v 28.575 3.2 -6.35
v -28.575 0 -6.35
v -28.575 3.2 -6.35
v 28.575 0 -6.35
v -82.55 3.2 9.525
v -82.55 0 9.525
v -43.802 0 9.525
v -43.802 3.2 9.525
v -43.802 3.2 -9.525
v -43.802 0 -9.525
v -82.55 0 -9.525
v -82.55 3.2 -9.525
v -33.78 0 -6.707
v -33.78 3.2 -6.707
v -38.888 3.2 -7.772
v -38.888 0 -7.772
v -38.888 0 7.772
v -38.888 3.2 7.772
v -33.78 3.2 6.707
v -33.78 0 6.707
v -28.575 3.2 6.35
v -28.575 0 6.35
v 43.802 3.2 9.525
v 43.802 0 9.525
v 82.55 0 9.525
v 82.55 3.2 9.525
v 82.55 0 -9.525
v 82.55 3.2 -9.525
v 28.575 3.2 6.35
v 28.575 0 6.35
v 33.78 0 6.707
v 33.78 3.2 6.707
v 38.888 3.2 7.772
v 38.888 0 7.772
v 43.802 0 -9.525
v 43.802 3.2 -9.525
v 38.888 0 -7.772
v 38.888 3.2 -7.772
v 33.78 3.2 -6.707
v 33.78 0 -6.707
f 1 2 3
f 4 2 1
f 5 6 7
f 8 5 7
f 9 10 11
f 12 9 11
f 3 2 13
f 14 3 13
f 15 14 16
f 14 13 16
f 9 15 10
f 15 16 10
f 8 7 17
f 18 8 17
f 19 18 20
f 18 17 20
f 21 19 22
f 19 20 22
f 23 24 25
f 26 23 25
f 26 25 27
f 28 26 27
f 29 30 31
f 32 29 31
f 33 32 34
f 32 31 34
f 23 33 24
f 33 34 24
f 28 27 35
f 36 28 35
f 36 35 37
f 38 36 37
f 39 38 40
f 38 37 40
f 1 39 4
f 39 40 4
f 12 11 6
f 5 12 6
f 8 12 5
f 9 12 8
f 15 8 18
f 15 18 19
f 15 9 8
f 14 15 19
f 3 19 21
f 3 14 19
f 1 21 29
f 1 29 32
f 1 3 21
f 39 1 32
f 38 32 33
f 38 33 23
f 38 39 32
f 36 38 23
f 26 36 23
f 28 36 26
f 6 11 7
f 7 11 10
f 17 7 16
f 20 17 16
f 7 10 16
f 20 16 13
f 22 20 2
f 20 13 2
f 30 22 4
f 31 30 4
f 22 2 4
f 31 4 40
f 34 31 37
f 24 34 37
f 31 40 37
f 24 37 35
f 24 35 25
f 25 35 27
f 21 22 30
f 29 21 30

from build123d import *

# Parameters (mm, degrees)
SKETCH1_W           = 57.15
SKETCH1_H           = 12.7
BOSS_EXTRUDE1_DEPTH = 3.2


with BuildPart() as part:
    # Sketch1 → Boss-Extrude1 (new body)
    with BuildSketch(Plane(origin=(0, 0, 0), x_dir=(1, 0, 0), z_dir=(0, 1, 0))):
        with BuildLine():
            Line((-28.575, -6.35), (-28.575, 6.35))
            ThreePointArc((-28.575, 6.35), (-36.352129933, 7.152195105), (-43.801765087, 9.525))
            Line((-43.801765087, 9.525), (-82.55, 9.525))
            Line((-82.55, 9.525), (-82.55, -9.525))
            Line((-82.55, -9.525), (-43.801765087, -9.525))
            ThreePointArc((-43.801765087, -9.525), (-36.352129933, -7.152195105), (-28.575, -6.35))
        make_face()
        Rectangle(SKETCH1_W, SKETCH1_H)
        with BuildLine():
            ThreePointArc((43.801765087, 9.525), (36.352129933, 7.152195105), (28.575, 6.35))
            Line((28.575, 6.35), (28.575, -6.35))
            ThreePointArc((28.575, -6.35), (36.352129933, -7.152195105), (43.801765087, -9.525))
            Line((43.801765087, -9.525), (82.55, -9.525))
            Line((82.55, -9.525), (82.55, 9.525))
            Line((82.55, 9.525), (43.801765087, 9.525))
        make_face()
    extrude(amount=BOSS_EXTRUDE1_DEPTH)


solid = part.part
